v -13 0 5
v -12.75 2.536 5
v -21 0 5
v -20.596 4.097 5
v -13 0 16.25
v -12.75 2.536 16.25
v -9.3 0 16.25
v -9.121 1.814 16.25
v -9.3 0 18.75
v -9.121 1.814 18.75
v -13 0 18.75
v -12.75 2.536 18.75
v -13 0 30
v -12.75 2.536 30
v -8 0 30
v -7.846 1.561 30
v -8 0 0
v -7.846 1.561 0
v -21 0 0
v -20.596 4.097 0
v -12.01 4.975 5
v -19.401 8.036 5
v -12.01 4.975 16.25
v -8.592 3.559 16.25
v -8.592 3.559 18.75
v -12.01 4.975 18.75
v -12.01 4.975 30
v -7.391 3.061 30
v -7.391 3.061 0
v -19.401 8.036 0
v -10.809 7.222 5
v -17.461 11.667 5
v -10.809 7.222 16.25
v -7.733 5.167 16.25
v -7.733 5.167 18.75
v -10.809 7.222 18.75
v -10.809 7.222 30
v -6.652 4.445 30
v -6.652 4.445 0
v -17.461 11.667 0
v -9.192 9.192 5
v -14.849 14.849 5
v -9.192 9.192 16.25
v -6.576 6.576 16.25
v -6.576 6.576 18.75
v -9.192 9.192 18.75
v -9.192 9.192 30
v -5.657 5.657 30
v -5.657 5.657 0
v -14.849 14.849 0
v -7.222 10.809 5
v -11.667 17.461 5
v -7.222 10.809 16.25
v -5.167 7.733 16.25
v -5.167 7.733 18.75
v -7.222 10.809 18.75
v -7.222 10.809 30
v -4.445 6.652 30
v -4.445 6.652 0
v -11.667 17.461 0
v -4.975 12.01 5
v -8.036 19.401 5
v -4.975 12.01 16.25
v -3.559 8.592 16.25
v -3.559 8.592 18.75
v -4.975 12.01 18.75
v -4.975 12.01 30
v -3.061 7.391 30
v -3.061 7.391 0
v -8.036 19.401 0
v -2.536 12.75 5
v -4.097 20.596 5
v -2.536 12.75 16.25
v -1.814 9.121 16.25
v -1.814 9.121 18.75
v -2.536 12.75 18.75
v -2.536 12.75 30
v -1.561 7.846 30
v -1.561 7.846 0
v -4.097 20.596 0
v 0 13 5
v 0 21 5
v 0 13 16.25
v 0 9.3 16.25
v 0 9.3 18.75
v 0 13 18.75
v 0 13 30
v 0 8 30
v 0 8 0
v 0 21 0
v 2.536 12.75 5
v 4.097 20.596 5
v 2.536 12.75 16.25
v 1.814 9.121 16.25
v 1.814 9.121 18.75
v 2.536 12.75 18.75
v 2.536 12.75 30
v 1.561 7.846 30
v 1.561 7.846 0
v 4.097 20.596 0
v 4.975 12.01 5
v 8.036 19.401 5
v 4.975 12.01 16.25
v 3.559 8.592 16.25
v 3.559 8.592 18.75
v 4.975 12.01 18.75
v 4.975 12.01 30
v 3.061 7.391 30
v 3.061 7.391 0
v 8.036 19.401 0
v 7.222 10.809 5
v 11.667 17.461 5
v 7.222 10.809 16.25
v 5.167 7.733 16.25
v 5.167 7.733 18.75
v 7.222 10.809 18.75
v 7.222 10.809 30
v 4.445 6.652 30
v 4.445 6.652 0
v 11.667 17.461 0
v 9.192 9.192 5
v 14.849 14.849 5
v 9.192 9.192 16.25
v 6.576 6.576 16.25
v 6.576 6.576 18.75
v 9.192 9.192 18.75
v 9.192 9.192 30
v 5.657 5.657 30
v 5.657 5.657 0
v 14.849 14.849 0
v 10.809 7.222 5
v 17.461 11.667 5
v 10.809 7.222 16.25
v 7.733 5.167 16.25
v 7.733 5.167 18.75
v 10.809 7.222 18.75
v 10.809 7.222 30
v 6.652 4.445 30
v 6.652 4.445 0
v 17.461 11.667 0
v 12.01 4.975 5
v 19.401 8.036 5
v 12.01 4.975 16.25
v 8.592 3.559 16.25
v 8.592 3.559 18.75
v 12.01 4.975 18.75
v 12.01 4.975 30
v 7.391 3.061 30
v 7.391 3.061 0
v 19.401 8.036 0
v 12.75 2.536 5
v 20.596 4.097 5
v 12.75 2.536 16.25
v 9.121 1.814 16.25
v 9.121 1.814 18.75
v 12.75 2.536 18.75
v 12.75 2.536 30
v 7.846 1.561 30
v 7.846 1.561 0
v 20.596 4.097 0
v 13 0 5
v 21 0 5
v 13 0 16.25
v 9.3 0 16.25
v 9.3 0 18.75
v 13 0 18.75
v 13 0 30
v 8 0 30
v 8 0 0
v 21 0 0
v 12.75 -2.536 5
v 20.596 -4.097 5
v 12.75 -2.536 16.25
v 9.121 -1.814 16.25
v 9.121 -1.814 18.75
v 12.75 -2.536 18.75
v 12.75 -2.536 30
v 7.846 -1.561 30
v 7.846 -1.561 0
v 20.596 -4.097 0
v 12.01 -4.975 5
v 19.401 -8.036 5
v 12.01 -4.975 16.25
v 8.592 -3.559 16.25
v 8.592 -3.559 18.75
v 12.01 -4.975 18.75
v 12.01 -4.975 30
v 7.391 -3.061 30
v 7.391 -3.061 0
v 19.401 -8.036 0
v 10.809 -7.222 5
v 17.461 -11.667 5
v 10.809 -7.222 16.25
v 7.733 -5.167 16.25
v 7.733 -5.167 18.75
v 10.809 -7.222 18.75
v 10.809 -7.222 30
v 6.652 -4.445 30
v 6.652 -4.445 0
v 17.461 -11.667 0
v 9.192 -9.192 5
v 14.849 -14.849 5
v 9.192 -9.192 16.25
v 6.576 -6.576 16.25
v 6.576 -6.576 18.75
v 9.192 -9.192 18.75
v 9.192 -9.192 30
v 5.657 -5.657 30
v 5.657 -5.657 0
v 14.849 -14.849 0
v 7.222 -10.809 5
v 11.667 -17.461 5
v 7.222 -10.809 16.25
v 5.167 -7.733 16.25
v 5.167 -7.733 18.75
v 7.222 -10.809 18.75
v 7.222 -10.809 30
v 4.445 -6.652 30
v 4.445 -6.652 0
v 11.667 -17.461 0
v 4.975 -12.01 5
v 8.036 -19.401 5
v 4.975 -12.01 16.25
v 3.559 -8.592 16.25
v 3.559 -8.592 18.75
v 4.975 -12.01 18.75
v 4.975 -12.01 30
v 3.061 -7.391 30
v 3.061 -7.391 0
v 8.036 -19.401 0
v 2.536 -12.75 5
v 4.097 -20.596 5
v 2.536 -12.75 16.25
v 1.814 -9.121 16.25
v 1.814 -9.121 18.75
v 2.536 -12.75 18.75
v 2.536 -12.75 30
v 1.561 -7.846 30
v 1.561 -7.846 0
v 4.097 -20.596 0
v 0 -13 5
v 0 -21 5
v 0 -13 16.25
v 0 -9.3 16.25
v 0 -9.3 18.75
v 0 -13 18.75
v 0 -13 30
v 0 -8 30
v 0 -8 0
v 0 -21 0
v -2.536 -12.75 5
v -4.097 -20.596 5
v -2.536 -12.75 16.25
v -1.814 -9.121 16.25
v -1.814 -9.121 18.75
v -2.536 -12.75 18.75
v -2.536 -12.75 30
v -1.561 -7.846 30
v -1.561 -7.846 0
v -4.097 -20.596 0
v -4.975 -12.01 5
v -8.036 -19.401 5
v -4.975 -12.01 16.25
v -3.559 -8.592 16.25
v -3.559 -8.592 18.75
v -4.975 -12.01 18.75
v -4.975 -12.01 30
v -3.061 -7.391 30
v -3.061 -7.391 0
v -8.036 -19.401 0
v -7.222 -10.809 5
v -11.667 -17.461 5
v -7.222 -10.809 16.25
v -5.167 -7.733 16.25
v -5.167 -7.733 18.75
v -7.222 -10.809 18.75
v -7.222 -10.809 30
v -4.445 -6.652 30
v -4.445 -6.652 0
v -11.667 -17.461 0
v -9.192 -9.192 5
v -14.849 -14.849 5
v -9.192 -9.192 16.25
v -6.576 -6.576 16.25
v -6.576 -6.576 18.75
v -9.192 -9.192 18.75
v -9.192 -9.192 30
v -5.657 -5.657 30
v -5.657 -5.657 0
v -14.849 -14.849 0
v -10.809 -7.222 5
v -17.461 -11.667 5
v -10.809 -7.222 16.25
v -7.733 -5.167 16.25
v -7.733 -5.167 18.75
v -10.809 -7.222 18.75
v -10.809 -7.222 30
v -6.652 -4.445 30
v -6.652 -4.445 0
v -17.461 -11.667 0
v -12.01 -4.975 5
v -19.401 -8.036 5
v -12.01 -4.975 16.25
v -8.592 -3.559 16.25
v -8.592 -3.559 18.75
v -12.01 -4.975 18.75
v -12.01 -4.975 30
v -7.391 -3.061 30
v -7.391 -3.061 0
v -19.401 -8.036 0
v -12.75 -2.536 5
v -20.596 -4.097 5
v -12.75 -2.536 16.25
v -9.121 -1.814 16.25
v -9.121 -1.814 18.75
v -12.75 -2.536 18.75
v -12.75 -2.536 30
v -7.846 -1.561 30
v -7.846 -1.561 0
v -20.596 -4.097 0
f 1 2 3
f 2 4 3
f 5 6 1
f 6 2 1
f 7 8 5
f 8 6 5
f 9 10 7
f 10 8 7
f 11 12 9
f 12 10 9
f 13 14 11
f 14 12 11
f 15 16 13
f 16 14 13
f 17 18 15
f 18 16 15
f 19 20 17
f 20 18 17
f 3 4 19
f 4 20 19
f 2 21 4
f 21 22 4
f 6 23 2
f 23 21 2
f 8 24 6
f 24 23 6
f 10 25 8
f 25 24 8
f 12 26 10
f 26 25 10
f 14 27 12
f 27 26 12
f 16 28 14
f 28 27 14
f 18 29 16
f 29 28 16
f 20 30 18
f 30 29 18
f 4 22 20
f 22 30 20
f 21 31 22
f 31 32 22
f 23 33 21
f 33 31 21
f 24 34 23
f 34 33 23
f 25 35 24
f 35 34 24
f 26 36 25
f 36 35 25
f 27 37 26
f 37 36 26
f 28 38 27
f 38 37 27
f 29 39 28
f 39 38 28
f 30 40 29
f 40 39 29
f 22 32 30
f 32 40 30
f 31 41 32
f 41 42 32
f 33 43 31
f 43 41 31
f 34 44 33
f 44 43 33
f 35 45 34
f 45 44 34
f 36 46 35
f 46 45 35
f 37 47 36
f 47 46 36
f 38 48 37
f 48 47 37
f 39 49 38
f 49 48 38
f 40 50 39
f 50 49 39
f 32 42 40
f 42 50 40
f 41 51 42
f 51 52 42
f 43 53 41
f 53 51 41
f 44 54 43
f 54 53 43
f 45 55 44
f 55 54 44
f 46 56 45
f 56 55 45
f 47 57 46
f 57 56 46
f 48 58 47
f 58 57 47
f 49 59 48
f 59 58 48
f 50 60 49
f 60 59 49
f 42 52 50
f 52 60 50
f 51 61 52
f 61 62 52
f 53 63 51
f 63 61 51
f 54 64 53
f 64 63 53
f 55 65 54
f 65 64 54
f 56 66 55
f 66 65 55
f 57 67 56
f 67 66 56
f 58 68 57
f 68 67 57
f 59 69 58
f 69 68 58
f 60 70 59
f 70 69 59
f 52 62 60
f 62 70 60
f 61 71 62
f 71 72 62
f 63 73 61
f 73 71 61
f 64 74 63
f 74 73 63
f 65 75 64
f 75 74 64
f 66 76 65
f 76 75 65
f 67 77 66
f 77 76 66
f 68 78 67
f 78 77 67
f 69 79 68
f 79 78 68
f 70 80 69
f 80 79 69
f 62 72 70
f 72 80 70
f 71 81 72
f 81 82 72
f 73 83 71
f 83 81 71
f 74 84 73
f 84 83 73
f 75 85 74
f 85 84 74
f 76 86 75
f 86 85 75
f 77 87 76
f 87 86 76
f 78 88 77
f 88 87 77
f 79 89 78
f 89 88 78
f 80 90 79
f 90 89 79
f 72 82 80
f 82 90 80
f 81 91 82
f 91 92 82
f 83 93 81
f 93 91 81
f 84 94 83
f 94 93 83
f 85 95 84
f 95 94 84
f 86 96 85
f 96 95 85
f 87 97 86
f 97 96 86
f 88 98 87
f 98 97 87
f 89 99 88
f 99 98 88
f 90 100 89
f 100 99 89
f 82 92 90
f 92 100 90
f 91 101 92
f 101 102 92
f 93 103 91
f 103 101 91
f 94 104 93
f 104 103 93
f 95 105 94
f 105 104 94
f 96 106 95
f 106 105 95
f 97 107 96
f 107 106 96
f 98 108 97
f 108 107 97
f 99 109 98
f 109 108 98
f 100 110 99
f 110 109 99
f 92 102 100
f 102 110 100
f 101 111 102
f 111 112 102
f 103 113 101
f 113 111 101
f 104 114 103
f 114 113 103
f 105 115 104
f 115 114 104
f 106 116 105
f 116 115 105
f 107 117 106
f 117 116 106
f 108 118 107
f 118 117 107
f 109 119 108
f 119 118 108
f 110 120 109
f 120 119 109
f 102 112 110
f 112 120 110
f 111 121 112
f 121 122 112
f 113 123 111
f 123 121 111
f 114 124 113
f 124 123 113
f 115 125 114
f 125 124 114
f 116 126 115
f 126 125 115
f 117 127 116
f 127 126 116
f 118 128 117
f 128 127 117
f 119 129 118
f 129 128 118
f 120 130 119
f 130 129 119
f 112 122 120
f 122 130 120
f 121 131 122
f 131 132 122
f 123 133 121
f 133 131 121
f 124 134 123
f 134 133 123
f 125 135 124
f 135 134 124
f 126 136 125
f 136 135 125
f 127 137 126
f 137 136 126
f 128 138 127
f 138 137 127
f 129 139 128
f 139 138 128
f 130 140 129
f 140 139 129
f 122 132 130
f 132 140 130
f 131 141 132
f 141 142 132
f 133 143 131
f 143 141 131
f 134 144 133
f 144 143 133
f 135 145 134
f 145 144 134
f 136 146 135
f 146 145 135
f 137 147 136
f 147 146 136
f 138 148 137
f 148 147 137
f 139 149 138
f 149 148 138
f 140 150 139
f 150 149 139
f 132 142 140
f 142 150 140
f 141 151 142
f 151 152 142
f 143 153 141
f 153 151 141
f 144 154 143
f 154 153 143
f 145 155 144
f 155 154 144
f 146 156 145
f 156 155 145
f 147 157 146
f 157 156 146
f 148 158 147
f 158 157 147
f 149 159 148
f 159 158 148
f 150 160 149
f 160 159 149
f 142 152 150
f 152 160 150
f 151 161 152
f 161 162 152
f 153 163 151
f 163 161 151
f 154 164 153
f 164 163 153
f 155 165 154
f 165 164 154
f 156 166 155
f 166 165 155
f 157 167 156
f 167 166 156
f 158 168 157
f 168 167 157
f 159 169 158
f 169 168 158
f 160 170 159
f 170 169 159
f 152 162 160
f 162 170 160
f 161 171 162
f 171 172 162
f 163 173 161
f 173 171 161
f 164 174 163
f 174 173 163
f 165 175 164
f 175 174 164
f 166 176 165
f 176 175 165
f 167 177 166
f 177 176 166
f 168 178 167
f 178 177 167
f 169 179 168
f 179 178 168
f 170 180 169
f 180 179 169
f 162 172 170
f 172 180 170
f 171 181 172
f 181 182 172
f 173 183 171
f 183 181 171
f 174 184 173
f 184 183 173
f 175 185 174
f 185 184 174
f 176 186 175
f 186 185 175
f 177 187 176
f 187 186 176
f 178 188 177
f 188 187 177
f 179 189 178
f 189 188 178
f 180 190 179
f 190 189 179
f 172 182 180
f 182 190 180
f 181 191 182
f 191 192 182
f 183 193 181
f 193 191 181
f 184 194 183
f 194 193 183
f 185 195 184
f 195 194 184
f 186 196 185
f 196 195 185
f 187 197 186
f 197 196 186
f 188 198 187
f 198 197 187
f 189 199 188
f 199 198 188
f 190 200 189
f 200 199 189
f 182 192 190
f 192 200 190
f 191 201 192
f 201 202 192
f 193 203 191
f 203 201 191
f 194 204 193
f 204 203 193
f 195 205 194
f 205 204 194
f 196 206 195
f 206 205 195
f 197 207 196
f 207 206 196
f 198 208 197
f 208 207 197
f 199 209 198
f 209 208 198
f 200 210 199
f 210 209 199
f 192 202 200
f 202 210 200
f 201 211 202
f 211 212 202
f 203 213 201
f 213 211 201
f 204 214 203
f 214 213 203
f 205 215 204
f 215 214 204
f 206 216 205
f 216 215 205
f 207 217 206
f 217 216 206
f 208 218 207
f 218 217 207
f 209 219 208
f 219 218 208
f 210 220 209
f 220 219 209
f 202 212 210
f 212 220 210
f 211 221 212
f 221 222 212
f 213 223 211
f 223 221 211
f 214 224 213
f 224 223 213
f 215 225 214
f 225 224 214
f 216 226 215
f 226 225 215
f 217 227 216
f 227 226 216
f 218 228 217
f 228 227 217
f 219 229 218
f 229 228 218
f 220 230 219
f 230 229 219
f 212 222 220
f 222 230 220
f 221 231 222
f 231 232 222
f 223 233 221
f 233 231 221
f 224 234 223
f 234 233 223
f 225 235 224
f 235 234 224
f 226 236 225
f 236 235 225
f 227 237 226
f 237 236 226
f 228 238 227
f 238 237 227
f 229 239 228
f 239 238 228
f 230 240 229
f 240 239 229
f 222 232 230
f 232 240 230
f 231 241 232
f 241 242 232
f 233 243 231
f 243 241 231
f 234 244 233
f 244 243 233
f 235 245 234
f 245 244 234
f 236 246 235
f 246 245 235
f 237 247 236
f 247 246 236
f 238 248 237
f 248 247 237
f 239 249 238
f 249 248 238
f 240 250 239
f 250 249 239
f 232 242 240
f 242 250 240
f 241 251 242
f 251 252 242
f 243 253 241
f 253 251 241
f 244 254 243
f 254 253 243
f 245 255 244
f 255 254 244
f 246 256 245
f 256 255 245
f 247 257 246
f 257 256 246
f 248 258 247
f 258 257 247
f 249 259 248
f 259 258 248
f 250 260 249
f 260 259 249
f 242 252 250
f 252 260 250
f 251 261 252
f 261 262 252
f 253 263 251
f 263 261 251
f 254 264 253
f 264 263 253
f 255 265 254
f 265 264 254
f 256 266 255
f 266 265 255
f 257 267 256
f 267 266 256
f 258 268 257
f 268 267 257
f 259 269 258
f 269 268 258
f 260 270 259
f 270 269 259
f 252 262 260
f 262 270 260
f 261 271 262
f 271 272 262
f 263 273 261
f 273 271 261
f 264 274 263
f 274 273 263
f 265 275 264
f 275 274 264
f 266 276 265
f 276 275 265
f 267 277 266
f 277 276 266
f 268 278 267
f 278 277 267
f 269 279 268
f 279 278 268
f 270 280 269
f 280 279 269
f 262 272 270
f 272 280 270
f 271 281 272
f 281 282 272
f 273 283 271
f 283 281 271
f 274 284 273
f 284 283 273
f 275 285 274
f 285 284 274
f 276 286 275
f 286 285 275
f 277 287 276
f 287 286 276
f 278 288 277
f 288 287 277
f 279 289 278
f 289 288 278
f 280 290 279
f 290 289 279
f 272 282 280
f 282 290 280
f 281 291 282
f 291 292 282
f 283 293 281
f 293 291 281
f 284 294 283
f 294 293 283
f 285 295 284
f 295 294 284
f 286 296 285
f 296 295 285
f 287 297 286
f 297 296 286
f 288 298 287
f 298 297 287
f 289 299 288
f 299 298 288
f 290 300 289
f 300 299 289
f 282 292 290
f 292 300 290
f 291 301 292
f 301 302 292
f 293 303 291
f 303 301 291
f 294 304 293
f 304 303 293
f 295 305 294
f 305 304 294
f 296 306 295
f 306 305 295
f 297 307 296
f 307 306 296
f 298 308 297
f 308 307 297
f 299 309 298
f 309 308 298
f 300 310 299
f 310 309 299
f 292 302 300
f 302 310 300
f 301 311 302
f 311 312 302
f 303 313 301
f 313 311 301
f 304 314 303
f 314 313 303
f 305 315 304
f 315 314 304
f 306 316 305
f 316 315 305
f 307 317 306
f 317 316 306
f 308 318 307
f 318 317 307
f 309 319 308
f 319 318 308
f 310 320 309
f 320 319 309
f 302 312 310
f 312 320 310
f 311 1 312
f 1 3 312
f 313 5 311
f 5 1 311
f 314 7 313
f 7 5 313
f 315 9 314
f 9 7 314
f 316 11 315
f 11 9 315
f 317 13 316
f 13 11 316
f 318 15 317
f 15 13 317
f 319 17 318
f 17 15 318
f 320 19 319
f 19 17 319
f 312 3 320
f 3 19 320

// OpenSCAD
$fn = 32;

// ----------------------------------------------------------------------
// Grooved revolve: flanged, bore R8
// ----------------------------------------------------------------------

// --- parameters (mm) ---
bore_r = 8;               // bore radius
outer_r = 13;             // outer radius of the body
total_h = 30;             // overall height, Z
wall = 5;                 // radial wall thickness
groove_w = 2.5;           // groove width
groove_d = 3.7;           // groove depth
grooves = 1;              // number of outer grooves
flange_r = 21;            // flange radius
flange_h = 5;             // flange height
fit_tol = 0.1;            // declared fit tolerance (prompt contract)
free_tol = 0.5;           // declared free tolerance (prompt contract)

bbox_x = 2 * flange_r;  // full diameter
bore_d = 2 * bore_r;  // bore diameter
body_d = 2 * outer_r;  // body diameter
flange_d = 2 * flange_r;  // flange diameter
revolve_angle = 360;  // full turn around the Z axis

profile = [[8, 0], [13, 0], [21, 0], [21, 5], [13, 5], [13, 16.25], [9.3, 16.25], [9.3, 18.75], [13, 18.75], [13, 30], [8, 30]];  // primary outline, 11 points, counter clockwise

// --- the one profile operation ---
rotate_extrude(angle = revolve_angle) polygon(points = profile);
